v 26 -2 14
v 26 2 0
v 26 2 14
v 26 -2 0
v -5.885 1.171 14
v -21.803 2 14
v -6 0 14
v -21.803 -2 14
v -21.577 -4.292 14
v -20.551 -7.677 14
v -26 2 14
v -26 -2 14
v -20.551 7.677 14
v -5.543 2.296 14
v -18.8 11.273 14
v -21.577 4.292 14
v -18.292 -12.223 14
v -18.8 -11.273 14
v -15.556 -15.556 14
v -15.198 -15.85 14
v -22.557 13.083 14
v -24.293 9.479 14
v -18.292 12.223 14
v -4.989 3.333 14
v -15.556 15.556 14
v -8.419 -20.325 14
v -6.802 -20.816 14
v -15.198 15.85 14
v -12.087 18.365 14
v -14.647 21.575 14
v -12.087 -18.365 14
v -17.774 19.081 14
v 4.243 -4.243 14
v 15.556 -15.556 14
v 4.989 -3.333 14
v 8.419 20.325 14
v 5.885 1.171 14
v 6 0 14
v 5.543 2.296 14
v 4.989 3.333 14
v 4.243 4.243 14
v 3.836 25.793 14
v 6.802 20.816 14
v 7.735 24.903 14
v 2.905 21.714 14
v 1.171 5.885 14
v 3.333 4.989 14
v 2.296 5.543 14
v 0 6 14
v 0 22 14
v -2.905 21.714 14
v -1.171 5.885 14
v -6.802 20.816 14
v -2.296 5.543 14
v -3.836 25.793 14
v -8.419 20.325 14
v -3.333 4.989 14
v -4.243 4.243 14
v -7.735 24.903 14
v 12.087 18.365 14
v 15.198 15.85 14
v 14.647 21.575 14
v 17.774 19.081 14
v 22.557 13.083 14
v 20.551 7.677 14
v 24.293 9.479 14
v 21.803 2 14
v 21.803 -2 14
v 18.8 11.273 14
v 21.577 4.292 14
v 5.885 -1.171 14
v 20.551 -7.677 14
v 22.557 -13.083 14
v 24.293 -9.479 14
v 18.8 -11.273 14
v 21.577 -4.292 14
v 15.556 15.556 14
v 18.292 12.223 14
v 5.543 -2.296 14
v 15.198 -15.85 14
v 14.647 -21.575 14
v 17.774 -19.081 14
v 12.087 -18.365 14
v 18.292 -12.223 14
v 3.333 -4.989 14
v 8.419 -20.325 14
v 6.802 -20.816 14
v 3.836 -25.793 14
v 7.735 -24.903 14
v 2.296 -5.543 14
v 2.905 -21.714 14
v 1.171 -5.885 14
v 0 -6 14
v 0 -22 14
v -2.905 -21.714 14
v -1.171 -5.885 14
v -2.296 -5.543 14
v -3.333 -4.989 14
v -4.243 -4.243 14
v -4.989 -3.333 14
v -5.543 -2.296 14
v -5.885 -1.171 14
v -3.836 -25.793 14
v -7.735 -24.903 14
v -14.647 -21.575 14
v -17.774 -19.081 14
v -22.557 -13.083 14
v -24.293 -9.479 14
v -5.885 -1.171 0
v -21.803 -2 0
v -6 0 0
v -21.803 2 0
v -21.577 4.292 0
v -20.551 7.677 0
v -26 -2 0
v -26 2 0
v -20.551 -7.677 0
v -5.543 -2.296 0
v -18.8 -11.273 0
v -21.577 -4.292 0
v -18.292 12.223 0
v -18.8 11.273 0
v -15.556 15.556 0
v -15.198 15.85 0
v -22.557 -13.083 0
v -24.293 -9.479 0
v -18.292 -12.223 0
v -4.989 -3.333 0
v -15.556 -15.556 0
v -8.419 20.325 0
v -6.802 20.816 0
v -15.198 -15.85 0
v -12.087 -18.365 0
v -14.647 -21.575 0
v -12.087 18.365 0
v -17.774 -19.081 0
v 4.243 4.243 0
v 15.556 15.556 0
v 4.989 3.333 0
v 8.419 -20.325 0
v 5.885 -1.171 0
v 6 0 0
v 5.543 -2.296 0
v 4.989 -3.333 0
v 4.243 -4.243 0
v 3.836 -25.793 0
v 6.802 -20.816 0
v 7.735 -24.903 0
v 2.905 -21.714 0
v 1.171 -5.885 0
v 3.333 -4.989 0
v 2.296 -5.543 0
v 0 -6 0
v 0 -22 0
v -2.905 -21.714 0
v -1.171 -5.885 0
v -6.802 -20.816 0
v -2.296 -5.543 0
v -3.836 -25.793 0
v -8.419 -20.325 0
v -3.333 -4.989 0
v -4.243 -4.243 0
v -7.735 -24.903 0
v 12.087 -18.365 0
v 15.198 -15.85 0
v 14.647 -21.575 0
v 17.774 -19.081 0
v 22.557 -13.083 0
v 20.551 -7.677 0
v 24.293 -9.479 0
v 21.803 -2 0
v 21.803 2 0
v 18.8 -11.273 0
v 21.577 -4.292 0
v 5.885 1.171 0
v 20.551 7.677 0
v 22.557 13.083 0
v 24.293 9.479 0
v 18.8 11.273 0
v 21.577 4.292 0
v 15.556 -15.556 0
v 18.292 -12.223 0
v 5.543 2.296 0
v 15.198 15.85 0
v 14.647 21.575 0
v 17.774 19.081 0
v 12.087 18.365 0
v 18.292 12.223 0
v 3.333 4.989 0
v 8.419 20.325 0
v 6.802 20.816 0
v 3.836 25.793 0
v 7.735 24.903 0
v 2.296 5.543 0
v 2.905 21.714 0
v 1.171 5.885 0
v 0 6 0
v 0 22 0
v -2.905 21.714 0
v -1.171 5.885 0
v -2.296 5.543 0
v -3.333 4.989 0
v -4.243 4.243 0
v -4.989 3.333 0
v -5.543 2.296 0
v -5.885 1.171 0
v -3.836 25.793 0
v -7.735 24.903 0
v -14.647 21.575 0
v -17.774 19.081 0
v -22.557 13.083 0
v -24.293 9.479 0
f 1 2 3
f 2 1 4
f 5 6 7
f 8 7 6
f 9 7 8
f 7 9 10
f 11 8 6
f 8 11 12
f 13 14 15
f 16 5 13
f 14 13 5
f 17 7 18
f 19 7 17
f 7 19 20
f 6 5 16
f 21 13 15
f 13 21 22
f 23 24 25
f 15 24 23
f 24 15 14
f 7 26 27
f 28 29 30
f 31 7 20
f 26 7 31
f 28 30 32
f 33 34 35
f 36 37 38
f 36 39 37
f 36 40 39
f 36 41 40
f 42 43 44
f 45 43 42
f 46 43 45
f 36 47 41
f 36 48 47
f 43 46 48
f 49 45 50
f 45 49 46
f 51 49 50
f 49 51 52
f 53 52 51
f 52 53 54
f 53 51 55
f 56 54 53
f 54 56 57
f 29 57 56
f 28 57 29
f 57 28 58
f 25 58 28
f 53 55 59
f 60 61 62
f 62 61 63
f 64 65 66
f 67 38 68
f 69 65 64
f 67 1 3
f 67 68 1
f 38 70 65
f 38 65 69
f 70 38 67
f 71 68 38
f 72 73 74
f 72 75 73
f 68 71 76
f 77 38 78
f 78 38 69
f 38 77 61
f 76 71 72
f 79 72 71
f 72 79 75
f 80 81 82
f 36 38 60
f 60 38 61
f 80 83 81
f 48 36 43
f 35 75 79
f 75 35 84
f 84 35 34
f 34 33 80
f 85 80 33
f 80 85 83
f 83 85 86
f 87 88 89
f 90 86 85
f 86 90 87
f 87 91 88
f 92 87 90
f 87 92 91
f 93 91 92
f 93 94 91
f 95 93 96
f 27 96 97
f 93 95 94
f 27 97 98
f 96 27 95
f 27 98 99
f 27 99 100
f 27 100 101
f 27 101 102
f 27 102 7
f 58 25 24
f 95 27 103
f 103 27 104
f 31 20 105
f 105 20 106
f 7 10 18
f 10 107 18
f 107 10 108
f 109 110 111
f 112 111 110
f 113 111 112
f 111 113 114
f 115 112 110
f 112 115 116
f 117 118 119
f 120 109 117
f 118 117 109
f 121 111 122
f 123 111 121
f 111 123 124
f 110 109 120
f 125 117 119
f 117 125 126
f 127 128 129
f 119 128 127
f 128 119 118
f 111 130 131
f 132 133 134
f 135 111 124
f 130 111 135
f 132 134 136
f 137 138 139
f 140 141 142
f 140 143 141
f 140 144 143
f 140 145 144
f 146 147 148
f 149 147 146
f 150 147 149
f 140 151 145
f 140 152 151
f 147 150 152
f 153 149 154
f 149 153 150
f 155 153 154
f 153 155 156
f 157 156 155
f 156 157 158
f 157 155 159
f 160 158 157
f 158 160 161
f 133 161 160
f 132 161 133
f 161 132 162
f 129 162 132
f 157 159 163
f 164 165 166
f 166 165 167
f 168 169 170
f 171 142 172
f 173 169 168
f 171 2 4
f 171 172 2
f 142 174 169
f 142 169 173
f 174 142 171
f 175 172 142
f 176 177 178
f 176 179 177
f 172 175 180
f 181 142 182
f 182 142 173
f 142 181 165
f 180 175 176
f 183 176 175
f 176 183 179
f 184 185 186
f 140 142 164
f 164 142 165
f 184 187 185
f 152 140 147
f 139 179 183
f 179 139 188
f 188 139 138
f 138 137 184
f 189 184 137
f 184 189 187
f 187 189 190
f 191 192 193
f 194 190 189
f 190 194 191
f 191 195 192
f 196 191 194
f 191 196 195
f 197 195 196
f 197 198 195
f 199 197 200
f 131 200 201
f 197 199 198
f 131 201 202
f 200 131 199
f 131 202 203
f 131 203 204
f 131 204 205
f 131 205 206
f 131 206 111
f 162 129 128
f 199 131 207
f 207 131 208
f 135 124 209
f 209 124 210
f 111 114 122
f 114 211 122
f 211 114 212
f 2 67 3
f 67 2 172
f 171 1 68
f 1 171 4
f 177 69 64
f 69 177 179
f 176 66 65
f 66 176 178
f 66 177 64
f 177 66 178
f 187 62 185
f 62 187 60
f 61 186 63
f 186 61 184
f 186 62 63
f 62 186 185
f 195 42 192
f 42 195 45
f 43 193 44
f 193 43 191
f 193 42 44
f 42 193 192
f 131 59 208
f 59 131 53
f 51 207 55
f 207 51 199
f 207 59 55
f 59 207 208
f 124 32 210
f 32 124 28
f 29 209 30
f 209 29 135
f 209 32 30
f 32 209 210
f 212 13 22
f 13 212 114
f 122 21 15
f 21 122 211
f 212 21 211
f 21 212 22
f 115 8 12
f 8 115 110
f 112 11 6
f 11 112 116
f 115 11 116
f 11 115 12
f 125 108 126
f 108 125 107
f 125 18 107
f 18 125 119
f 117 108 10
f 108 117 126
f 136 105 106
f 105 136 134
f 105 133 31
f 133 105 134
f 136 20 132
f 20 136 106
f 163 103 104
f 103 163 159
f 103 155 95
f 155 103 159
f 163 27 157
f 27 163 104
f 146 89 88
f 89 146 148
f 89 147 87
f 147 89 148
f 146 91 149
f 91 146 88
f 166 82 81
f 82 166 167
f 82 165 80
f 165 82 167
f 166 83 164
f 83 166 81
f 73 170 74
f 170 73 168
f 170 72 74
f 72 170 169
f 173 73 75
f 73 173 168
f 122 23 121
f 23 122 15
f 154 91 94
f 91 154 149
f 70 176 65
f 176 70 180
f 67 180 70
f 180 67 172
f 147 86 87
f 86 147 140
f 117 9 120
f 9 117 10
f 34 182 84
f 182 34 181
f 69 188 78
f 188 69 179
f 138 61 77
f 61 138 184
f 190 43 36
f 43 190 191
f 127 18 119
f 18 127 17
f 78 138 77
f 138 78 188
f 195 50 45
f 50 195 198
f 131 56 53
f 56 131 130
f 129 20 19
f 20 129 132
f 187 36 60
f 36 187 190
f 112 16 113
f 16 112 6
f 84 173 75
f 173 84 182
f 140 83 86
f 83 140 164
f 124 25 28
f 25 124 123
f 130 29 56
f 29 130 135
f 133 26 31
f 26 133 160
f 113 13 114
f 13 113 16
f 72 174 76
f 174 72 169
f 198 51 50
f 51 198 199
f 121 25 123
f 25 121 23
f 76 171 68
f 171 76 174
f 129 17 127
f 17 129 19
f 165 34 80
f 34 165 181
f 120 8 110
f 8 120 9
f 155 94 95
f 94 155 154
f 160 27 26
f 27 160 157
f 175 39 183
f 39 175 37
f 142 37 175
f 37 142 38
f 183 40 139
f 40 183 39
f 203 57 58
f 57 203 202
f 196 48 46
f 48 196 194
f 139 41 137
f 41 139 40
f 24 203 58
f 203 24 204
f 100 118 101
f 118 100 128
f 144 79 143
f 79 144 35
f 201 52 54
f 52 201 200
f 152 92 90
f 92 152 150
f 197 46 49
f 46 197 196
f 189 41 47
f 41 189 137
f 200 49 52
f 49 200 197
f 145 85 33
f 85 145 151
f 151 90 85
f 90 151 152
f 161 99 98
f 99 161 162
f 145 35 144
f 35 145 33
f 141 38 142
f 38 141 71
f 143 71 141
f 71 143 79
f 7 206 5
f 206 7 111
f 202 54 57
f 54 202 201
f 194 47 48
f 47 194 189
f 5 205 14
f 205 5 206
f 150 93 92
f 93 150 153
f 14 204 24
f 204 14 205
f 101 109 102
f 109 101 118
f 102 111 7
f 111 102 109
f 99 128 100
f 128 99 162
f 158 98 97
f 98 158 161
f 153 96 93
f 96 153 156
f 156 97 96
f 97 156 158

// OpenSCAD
$fn = 32;

// ----------------------------------------------------------------------
// Spur blank: bored gear blank
// ----------------------------------------------------------------------

// --- parameters (mm) ---
disc_r = 22;              // blank root radius
disc_t = 14;              // blank thickness
n_teeth = 14;             // stub tooth count
tooth_w = 4;              // tooth width at the root
tooth_h = 4;              // tooth height above the root
bore_r = 6;               // central bore radius

out_r = disc_r + tooth_h;  // tip radius
bbox_x = 52.0;  // measured width over the teeth
bbox_y = 51.59;  // measured depth over the teeth

difference() {
union() {
  cylinder(r = disc_r, h = disc_t);
  for (i = [0 : n_teeth - 1])
    rotate([0, 0, i * 360 / n_teeth])
      translate([disc_r - 1, -tooth_w / 2, 0])
        cube([tooth_h + 1, tooth_w, disc_t]);
}
  translate([0, 0, -1]) cylinder(r = bore_r, h = disc_t + 2);
}
